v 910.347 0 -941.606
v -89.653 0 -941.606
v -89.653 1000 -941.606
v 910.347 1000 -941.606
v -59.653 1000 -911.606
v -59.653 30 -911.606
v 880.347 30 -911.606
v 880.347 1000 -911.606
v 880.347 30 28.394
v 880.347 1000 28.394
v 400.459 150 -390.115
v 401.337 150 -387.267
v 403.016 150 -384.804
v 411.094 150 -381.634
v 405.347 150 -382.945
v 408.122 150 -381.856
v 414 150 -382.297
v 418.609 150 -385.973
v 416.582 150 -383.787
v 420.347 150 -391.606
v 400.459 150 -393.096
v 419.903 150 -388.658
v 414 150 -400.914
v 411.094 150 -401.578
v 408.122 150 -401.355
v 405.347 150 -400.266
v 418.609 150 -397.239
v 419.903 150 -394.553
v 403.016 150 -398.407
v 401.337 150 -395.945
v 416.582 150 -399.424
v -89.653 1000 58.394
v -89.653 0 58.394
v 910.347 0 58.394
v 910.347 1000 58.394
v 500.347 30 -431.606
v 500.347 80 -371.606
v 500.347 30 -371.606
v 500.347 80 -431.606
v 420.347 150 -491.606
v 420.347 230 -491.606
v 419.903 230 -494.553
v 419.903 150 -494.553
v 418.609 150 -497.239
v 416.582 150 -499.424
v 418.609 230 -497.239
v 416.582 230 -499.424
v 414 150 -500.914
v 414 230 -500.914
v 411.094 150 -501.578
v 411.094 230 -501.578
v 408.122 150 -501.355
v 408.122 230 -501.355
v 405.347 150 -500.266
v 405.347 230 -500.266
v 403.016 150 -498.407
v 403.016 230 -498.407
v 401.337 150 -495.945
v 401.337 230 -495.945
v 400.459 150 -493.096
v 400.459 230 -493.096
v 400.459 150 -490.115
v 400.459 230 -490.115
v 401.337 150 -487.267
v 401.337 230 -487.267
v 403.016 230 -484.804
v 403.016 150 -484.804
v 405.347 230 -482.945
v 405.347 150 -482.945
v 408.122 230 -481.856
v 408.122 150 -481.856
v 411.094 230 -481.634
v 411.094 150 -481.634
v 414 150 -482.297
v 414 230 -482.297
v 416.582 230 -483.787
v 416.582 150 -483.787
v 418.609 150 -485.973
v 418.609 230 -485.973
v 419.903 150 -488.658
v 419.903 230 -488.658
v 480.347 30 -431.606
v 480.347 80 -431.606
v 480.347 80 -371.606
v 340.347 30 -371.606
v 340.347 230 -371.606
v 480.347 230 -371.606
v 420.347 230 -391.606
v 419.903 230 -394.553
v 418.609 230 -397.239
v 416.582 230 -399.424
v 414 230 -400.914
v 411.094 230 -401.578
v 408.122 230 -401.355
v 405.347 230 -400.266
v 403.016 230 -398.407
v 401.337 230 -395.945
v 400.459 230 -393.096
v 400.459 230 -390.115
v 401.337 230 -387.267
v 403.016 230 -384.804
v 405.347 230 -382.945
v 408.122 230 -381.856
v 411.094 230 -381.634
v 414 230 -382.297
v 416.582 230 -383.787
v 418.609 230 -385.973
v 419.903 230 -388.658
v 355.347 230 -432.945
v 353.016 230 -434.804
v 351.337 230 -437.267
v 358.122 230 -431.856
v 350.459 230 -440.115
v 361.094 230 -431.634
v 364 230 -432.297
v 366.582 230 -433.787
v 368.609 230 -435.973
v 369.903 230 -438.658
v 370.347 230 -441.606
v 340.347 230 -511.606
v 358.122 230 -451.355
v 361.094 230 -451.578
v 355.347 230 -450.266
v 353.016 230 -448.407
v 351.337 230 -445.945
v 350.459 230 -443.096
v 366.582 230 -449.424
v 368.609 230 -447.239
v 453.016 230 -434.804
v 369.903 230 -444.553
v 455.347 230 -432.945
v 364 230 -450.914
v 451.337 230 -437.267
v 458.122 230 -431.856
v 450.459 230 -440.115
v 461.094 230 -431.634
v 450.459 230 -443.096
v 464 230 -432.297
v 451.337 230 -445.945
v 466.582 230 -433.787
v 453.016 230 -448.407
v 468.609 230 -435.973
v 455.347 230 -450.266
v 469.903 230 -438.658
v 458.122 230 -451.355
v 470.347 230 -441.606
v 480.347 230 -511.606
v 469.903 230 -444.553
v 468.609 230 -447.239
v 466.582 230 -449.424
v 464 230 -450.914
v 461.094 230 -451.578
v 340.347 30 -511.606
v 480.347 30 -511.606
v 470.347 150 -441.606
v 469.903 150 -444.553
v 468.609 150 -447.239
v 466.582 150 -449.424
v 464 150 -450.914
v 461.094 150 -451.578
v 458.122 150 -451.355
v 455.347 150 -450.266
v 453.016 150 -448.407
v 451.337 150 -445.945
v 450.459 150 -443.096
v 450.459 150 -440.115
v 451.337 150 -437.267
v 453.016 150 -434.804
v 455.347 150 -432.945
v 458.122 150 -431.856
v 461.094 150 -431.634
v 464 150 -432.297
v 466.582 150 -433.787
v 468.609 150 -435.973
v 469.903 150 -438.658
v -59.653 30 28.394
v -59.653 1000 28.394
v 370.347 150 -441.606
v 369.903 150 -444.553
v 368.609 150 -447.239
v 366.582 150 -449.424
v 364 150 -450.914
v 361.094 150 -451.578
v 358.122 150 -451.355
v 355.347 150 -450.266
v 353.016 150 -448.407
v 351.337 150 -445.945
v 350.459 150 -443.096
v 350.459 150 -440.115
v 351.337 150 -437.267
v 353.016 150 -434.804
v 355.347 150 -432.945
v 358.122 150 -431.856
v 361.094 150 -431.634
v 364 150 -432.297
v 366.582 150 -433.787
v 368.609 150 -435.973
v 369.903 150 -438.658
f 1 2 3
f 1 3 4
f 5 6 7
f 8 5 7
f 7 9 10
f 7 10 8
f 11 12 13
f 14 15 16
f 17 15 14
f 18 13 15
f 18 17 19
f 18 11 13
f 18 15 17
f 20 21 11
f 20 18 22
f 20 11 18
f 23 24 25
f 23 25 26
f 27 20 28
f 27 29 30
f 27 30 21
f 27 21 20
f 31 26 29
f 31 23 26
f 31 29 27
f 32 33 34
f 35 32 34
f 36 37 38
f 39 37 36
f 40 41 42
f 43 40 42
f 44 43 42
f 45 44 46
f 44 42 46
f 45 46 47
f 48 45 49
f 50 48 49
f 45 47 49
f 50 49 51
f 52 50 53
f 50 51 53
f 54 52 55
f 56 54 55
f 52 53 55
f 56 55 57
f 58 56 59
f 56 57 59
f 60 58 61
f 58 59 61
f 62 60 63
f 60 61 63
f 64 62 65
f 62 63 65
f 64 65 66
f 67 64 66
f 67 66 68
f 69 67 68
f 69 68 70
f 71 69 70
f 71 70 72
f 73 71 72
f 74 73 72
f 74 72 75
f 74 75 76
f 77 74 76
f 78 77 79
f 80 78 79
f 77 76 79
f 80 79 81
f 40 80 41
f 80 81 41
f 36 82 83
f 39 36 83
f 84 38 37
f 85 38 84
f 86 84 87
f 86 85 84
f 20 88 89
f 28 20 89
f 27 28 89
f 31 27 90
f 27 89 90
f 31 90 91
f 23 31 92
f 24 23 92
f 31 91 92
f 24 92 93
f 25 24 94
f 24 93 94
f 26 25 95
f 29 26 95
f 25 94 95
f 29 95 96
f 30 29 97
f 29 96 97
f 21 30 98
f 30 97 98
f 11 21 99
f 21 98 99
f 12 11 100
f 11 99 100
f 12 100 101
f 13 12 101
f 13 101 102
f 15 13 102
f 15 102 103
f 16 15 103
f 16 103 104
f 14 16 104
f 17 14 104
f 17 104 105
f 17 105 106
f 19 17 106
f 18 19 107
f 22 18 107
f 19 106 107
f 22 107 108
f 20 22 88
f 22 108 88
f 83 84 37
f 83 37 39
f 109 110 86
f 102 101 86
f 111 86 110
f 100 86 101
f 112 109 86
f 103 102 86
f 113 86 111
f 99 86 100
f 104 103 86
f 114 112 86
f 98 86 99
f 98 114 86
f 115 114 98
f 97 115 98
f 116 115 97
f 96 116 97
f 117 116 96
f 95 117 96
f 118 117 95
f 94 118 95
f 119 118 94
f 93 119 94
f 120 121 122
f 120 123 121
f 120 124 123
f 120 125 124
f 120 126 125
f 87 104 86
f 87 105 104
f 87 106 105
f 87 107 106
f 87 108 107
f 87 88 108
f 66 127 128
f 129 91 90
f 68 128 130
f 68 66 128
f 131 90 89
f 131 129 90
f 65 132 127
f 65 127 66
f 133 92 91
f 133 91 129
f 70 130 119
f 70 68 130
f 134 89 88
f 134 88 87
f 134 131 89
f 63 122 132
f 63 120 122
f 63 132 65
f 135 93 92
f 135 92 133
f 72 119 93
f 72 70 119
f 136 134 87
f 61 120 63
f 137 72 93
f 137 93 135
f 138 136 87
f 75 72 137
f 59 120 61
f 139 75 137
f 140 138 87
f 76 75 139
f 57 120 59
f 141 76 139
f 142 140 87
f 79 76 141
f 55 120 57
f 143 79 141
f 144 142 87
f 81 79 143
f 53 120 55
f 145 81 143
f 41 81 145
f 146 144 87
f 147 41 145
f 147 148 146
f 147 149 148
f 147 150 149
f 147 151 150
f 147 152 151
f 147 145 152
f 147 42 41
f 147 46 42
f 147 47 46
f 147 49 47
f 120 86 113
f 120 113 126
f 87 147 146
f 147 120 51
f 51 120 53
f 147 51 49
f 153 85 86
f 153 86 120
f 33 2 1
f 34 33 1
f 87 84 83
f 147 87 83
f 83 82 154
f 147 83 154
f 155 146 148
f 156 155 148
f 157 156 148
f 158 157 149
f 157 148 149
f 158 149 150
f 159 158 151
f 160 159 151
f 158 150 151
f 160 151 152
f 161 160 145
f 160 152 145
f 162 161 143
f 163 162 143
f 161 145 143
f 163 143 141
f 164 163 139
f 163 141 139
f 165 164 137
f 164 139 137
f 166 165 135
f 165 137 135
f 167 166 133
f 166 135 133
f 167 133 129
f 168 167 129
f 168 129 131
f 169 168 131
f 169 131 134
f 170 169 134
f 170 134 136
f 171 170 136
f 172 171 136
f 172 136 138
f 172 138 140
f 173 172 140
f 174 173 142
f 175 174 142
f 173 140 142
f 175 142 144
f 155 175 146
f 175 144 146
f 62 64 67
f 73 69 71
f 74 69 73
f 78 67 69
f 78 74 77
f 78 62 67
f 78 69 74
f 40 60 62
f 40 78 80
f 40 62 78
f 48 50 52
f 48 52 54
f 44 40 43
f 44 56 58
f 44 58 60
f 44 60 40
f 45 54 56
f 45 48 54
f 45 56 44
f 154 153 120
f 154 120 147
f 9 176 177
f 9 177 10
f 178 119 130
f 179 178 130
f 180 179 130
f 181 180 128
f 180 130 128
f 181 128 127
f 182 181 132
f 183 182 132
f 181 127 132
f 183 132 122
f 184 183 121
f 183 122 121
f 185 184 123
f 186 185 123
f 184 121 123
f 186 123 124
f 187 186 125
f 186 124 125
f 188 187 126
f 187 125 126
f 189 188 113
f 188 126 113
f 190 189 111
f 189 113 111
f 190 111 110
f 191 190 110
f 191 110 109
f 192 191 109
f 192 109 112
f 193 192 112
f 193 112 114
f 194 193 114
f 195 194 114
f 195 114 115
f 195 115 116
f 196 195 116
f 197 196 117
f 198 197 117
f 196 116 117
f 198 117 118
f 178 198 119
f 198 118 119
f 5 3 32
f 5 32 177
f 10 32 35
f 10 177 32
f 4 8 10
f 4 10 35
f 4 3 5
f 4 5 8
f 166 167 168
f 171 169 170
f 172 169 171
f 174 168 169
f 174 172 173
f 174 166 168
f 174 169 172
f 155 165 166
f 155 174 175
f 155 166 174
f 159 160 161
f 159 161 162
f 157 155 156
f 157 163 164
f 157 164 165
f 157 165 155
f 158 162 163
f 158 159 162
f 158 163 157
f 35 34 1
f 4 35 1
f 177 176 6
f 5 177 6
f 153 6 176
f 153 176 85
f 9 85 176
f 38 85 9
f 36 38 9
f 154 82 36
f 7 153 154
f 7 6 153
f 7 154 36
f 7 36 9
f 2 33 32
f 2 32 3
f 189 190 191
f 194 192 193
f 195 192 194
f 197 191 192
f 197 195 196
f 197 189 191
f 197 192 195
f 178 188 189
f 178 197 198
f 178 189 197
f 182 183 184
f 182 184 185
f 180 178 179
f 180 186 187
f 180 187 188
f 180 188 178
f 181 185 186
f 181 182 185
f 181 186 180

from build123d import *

# Parameters (mm, degrees)
SKETCH1_W           = 1000
SKETCH1_H           = 1000
BOSS_EXTRUDE1_DEPTH = 1000
SHELL1_T            = -30
SKETCH4_W           = 140
SKETCH4_H           = 140
BOSS_EXTRUDE2_DEPTH = 200
SKETCH5_W           = 60
SKETCH5_H           = 50
BOSS_EXTRUDE3_DEPTH = 20
SKETCH6_R           = 10
CUT_EXTRUDE5_DEPTH  = 80


with BuildPart() as part:
    # Sketch1 → Boss-Extrude1 (new body)
    with BuildSketch(Plane(origin=(0, 0, 0), x_dir=(1, 0, 0), z_dir=(0, 1, 0))):
        with Locations((410.346861064, 441.605744818)):
            Rectangle(SKETCH1_W, SKETCH1_H)
    extrude(amount=BOSS_EXTRUDE1_DEPTH)

    # Shell1
    shell1_openings = [part.faces().sort_by_distance(p)[0] for p in [
        (410.346861064, 1000, -441.605744818),
    ]]
    offset(amount=SHELL1_T, openings=shell1_openings, kind=Kind.INTERSECTION)

    # Sketch4 → Boss-Extrude2 (add)
    with BuildSketch(Plane(origin=(0, 30, 0), x_dir=(1, 0, 0), z_dir=(0, 1, 0))):
        with Locations((410.346861064, 441.605744818)):
            Rectangle(SKETCH4_W, SKETCH4_H)
    extrude(amount=BOSS_EXTRUDE2_DEPTH)

    # Sketch5 → Boss-Extrude3 (add)
    with BuildSketch(Plane(origin=(480.346861064, 0, 0), x_dir=(0, 0, -1), z_dir=(1, 0, 0))):
        with Locations((401.605744818, 55)):
            Rectangle(SKETCH5_W, SKETCH5_H)
    extrude(amount=BOSS_EXTRUDE3_DEPTH)

    # Sketch6 → Cut-Extrude5 (cut)
    with BuildSketch(Plane(origin=(0, 230, 0), x_dir=(1, 0, 0), z_dir=(0, 1, 0))):
        with Locations((410.346861064, 491.605744818)):
            Circle(SKETCH6_R)
        with Locations((360.346861064, 441.605744818)):
            Circle(SKETCH6_R)
        with Locations((410.346861064, 391.605744818)):
            Circle(SKETCH6_R)
        with Locations((460.346861064, 441.605744818)):
            Circle(SKETCH6_R)
    extrude(amount=-CUT_EXTRUDE5_DEPTH, mode=Mode.SUBTRACT)


solid = part.part
